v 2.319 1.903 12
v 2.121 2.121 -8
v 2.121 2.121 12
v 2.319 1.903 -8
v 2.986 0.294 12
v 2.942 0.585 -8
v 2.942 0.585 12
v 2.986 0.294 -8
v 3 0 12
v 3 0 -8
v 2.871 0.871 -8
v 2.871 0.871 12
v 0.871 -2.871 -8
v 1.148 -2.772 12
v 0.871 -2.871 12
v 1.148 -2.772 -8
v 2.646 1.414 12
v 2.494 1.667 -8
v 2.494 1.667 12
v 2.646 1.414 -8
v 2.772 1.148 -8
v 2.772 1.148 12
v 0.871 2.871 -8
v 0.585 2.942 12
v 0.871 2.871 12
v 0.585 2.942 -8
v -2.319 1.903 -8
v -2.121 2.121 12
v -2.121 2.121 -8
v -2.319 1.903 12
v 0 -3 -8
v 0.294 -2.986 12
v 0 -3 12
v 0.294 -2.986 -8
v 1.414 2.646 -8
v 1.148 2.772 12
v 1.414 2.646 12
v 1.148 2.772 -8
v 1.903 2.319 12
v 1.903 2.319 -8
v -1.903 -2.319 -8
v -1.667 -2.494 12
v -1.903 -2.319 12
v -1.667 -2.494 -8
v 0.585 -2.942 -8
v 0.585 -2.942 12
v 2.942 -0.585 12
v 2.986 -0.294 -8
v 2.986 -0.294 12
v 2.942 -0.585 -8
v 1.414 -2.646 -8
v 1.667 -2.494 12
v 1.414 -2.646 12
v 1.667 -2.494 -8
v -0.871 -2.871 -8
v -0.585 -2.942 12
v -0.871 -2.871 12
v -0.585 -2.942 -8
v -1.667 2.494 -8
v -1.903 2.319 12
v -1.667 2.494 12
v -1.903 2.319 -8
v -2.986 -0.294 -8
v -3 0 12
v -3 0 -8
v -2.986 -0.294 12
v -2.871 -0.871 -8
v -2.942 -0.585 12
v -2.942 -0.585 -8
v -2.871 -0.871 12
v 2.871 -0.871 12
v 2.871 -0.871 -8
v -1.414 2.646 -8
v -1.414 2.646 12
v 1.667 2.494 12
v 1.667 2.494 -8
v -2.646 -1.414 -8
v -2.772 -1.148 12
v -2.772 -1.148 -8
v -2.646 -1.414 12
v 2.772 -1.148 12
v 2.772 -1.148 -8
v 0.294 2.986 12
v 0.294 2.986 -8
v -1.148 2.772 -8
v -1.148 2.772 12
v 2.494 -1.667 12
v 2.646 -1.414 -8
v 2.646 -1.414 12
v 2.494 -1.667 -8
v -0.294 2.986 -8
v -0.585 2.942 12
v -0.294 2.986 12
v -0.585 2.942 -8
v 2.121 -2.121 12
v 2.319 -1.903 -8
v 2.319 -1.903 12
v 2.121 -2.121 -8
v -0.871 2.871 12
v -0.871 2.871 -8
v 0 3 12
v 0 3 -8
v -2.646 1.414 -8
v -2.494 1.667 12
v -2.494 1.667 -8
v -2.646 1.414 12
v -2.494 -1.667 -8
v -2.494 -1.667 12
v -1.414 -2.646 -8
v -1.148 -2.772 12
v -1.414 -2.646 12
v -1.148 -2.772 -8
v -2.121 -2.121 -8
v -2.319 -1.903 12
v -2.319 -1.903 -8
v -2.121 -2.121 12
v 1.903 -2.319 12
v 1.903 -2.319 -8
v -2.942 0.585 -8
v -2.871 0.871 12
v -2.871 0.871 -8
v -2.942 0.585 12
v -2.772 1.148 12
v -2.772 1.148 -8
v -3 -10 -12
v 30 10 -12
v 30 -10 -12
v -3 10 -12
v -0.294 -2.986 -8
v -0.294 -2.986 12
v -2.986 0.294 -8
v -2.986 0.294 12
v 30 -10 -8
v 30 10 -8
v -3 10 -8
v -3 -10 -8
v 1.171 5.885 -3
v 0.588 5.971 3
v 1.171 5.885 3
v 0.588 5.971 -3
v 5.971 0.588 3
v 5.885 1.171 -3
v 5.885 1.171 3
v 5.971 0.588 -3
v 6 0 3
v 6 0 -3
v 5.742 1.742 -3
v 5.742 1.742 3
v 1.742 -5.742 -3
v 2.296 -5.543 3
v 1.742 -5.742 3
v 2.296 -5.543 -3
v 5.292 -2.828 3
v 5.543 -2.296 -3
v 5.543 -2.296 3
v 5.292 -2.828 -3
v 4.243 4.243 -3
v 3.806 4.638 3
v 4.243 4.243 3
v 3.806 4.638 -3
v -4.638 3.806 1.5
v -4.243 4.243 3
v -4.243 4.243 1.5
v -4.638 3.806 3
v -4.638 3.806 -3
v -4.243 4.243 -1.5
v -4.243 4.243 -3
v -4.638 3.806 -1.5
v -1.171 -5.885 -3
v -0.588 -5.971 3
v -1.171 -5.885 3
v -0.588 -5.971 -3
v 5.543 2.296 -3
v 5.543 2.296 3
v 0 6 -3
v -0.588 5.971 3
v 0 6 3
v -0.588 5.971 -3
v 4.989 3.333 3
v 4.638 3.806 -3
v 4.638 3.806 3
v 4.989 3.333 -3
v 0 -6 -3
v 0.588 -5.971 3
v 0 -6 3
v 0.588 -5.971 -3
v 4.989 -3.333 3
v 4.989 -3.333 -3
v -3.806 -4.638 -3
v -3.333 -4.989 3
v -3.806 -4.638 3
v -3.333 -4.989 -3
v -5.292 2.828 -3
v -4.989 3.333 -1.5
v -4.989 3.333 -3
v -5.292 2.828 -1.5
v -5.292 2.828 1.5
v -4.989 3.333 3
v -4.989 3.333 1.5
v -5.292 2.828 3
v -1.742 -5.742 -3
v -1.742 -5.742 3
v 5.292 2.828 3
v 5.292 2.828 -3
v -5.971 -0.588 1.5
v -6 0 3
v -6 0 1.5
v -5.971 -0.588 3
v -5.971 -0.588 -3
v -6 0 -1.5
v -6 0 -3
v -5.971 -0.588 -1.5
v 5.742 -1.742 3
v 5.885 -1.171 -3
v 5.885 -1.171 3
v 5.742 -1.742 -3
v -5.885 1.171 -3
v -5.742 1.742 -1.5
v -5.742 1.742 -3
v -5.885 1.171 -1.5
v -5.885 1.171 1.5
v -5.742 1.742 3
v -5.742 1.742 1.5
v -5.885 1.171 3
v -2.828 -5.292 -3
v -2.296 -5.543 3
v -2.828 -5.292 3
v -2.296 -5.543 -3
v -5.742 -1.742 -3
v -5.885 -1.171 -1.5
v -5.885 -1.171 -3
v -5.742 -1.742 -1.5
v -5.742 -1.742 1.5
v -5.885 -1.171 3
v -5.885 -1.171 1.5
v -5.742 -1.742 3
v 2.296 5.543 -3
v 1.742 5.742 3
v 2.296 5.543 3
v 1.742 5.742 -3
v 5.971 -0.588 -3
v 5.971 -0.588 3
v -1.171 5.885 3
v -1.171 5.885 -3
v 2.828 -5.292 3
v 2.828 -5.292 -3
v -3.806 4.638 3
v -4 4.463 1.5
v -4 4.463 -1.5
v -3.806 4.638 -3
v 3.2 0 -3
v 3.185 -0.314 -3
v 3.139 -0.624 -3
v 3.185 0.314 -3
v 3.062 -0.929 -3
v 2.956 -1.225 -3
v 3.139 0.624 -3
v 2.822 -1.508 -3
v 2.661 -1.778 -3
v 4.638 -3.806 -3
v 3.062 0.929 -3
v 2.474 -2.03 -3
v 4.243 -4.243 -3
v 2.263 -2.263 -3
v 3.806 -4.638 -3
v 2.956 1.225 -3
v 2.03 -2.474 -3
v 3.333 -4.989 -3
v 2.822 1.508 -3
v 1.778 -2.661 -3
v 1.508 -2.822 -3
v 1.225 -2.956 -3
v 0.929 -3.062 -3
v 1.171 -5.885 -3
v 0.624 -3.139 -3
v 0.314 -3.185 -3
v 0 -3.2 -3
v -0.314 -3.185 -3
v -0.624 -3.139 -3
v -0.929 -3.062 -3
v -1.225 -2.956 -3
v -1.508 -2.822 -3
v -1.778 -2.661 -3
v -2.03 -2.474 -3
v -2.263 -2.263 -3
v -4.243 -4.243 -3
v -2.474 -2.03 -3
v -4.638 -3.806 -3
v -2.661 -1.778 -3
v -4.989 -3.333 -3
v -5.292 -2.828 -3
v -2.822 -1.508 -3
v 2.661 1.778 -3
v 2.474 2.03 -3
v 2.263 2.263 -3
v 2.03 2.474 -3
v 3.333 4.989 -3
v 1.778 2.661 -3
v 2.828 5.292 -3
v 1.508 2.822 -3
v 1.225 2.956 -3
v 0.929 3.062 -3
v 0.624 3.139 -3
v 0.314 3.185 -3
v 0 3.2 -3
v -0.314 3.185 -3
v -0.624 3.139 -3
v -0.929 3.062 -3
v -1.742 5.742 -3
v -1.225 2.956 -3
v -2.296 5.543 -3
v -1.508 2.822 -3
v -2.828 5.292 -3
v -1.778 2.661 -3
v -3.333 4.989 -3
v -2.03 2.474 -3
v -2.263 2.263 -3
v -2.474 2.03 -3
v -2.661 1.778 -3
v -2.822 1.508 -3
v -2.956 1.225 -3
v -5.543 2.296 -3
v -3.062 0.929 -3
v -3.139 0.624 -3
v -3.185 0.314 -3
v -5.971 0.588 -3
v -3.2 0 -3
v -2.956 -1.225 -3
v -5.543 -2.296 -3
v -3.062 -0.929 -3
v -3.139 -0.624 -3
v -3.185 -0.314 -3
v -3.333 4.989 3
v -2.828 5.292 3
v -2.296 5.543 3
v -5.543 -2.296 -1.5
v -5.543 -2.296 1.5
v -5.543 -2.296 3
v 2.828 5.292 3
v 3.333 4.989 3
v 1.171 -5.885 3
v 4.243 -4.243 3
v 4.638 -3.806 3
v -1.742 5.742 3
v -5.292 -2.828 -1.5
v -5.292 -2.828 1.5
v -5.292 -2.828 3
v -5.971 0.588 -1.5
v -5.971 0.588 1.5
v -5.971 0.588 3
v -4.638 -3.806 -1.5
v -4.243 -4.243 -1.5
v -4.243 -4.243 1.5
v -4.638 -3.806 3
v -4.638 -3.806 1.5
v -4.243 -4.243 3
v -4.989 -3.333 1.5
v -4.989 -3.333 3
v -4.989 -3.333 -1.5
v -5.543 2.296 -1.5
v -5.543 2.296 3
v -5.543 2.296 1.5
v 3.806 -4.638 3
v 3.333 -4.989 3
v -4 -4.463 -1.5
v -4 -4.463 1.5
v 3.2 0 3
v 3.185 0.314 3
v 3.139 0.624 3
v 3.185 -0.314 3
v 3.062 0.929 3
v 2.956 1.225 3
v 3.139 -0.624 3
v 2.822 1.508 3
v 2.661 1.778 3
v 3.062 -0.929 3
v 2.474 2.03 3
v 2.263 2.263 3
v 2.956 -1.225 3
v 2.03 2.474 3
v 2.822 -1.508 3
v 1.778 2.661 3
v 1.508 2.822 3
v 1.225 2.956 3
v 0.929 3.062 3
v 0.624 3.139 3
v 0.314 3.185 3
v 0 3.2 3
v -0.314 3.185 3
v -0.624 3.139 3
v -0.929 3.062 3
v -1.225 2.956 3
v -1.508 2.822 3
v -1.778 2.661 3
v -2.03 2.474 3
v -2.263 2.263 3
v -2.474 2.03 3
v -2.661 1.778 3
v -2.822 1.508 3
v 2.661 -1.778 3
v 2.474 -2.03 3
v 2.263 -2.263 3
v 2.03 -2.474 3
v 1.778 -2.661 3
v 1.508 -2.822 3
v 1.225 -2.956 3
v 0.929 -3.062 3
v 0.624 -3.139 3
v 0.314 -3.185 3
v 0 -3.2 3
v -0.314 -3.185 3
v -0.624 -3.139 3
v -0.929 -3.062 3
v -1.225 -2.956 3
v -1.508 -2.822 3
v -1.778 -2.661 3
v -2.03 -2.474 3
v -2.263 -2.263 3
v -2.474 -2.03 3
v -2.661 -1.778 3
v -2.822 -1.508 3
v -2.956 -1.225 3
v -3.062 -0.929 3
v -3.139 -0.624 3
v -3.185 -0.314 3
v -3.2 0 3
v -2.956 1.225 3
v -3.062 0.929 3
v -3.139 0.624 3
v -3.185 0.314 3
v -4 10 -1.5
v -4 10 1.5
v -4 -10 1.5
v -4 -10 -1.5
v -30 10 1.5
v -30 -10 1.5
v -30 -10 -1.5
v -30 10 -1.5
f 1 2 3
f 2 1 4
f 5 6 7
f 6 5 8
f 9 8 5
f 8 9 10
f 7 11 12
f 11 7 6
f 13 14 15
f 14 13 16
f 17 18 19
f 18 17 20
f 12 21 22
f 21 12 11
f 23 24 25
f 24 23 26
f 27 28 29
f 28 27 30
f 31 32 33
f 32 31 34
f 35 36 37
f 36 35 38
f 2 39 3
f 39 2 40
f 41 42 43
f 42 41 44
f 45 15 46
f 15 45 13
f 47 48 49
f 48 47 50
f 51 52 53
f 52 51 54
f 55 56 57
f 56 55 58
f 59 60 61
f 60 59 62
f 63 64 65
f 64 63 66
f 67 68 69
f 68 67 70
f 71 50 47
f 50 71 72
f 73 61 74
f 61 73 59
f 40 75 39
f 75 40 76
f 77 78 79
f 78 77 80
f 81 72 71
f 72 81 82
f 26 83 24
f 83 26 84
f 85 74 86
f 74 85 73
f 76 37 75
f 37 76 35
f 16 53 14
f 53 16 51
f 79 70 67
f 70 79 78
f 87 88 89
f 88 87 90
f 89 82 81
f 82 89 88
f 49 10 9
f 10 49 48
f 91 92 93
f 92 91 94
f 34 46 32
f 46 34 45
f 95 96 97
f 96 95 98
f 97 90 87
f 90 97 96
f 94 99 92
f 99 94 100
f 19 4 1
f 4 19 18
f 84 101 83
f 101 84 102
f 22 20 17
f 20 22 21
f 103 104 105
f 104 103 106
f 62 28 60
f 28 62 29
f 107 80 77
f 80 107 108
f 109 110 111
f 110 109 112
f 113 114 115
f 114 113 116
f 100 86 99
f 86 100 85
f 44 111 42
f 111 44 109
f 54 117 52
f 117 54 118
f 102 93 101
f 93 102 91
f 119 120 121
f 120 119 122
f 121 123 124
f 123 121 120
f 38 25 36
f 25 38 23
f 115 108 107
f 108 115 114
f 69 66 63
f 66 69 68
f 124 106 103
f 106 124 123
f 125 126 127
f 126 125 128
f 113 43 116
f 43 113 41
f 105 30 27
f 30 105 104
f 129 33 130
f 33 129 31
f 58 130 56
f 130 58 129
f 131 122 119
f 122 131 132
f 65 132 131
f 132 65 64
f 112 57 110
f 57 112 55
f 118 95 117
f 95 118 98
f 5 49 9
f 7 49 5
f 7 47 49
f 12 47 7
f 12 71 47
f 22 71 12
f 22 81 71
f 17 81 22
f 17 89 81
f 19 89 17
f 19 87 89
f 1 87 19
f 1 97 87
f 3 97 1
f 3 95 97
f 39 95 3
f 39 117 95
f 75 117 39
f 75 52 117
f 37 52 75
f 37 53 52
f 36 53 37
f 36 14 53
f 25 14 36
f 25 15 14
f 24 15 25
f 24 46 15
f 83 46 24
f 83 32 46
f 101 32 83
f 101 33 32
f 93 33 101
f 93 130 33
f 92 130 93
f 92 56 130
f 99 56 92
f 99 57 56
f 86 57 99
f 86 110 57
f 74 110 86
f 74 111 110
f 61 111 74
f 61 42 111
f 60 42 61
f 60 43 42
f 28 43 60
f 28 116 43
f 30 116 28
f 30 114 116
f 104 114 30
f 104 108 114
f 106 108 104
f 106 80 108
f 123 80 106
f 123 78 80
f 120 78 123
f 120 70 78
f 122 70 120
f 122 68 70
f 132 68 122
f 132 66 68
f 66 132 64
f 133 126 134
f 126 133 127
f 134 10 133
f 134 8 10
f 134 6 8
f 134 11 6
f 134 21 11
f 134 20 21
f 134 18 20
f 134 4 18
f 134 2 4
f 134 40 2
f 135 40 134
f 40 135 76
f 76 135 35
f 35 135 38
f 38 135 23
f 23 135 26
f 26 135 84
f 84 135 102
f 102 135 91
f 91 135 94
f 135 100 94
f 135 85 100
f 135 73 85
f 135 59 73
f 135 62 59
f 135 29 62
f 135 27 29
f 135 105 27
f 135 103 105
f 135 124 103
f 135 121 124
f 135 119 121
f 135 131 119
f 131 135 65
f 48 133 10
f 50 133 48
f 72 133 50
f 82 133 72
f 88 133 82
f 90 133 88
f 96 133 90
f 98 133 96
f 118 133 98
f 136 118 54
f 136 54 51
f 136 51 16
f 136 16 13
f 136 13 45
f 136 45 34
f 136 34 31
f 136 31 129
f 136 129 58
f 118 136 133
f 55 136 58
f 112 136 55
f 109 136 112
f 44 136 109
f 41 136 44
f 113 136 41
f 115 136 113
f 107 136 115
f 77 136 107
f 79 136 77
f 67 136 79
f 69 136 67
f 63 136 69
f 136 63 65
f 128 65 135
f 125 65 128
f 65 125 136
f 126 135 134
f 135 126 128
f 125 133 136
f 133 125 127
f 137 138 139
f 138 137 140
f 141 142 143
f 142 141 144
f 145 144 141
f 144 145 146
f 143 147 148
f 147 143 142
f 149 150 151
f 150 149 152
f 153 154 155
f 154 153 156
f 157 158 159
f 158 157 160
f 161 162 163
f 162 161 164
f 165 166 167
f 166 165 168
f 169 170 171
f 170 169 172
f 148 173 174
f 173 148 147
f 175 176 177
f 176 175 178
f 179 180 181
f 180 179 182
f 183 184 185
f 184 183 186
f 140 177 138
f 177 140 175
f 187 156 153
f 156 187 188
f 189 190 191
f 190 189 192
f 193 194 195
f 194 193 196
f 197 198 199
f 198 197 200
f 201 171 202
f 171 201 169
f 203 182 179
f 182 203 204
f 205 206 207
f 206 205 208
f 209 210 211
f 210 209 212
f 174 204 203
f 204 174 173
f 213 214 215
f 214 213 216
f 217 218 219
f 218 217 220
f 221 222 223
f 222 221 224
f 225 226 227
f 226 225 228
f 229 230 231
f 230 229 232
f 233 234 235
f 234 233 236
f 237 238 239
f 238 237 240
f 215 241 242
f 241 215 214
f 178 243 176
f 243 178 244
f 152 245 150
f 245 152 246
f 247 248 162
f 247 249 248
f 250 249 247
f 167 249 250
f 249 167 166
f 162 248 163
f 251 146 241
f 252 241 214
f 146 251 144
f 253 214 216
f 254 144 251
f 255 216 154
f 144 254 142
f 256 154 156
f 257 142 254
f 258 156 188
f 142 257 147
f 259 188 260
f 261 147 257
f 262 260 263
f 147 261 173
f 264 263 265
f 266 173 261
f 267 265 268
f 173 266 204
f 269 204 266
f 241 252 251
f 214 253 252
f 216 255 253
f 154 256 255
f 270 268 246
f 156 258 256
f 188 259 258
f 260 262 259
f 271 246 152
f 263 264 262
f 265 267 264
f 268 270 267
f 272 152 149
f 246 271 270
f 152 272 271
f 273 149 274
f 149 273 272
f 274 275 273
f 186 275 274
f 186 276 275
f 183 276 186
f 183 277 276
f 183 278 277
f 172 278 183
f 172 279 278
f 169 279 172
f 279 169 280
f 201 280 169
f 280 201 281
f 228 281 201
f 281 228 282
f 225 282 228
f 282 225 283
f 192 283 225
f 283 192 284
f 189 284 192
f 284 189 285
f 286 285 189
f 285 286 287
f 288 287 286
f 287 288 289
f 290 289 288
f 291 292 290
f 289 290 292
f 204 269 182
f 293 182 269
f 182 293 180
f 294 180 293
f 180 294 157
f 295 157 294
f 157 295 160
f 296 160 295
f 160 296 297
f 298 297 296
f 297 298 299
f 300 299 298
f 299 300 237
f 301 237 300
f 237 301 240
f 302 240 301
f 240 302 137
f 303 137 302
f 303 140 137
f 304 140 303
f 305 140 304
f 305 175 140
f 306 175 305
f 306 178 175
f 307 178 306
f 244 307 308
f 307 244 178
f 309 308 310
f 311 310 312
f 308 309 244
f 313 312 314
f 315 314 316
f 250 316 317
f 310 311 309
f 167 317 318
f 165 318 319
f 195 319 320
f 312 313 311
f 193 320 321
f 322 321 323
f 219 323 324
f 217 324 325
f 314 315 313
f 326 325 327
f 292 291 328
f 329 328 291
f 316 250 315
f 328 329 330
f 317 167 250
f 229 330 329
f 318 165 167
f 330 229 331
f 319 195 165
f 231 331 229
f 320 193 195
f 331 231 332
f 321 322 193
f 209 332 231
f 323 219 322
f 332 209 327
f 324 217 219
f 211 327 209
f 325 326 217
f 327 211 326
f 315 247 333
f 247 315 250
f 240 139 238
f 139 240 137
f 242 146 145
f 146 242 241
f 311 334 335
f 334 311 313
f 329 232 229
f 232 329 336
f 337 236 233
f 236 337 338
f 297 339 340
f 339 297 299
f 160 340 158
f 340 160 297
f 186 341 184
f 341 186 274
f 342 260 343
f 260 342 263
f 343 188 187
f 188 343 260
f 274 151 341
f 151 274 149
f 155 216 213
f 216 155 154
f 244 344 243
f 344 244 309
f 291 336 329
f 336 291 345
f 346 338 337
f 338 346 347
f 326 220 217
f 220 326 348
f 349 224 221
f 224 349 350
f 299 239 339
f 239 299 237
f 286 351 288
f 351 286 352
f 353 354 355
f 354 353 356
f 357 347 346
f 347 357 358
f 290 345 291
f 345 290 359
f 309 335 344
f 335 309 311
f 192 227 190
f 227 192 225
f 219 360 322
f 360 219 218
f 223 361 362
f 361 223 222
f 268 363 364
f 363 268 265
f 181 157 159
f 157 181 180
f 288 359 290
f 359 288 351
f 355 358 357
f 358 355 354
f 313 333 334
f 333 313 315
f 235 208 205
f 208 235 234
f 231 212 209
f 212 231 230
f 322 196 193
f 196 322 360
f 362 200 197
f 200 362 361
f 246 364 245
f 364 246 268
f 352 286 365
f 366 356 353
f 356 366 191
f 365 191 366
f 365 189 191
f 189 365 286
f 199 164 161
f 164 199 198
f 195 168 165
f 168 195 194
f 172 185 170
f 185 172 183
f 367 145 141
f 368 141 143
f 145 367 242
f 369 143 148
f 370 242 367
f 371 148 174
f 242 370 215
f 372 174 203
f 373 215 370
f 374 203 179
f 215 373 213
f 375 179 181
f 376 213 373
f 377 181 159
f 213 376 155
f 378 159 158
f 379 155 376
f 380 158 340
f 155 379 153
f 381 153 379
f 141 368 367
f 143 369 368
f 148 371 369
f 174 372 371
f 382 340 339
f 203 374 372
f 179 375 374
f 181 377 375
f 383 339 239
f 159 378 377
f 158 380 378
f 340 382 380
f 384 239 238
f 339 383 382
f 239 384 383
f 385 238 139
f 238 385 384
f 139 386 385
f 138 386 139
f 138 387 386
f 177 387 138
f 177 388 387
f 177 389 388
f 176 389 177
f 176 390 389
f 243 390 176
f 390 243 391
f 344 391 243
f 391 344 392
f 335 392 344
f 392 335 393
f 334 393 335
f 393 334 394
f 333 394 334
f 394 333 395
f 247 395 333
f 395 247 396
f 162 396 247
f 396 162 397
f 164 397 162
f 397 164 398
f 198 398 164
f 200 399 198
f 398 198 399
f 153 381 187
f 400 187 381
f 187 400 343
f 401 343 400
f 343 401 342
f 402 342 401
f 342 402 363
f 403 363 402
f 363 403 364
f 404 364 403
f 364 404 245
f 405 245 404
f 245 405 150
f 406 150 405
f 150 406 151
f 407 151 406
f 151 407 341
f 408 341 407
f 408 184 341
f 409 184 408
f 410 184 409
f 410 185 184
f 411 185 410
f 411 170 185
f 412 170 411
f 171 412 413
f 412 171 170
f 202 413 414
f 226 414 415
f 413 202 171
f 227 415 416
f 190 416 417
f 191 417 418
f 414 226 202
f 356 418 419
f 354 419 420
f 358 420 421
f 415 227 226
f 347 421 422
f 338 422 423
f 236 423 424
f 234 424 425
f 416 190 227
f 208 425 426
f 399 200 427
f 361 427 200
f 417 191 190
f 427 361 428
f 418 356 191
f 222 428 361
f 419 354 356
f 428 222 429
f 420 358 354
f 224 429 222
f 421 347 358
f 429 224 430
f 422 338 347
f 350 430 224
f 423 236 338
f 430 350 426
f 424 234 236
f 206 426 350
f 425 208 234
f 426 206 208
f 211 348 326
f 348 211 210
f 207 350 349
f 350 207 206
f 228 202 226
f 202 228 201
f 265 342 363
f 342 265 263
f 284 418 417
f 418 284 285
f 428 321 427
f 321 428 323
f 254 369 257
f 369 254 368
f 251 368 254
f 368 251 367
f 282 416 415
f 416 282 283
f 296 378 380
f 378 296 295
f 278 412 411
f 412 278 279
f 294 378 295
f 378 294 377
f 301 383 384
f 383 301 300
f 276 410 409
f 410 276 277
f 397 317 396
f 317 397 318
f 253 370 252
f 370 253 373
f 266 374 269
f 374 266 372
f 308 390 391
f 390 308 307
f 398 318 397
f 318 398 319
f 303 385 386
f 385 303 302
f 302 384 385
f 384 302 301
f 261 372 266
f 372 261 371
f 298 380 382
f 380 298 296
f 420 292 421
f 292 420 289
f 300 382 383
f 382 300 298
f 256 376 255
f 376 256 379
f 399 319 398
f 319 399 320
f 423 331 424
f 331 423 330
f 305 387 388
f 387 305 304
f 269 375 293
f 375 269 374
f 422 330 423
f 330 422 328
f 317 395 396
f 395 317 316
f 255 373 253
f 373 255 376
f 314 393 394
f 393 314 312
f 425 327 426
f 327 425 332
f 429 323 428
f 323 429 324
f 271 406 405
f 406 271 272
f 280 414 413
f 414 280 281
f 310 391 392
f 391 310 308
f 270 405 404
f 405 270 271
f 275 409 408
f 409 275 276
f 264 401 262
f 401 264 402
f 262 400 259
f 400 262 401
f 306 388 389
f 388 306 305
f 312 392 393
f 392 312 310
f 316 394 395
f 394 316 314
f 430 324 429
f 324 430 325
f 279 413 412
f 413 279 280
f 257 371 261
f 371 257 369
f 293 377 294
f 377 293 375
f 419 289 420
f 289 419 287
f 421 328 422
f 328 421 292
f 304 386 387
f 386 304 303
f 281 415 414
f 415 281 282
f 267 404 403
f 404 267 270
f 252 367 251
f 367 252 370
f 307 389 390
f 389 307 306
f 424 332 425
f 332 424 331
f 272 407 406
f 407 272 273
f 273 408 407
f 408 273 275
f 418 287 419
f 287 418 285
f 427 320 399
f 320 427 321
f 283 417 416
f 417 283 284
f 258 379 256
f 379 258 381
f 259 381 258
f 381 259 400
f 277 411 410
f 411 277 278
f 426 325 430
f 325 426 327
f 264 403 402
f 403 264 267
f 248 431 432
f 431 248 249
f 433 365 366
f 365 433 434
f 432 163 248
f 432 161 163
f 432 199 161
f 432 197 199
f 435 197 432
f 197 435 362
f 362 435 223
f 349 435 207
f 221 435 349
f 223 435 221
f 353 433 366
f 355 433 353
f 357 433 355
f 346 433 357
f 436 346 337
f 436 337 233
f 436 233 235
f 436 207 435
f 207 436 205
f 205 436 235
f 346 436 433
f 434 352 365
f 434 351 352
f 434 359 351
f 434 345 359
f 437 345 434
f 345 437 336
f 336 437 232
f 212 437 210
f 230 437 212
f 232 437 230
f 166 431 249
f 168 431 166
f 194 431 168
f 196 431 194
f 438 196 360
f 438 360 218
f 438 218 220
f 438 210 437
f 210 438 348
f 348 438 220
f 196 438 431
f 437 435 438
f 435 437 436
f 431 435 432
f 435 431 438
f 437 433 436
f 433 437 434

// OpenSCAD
$fn = 64;

agentscad_part = "all";
hinge_angle = 0;

pin_d = 6;
pin_r = pin_d / 2;
clearance = 0.4;
hole_r = (pin_d + clearance) / 2;
pin_h = 24;
pin_z0 = -12;
bushing_outer_r = 6;
bushing_h = 6;
bushing_z0 = -3;
moving_leaf_thickness = 3;
moving_leaf_z0 = -1.5;
fixed_leaf_thickness = 4;
fixed_leaf_z0 = -12;

module fixed_part() {
    union() {
        translate([0, 0, pin_z0])
            cylinder(h = pin_h, r = pin_r, center = false);
        translate([-3, -10, fixed_leaf_z0])
            cube([33, 20, fixed_leaf_thickness]);
    }
}

module moving_part() {
    rotate([0, 0, hinge_angle])
    union() {
        translate([0, 0, bushing_z0])
            difference() {
                cylinder(h = bushing_h, r = bushing_outer_r, center = false);
                translate([0, 0, -0.01])
                    cylinder(h = bushing_h + 0.02, r = hole_r, center = false);
            }
        translate([-30, -10, moving_leaf_z0])
            cube([26, 20, moving_leaf_thickness]);
    }
}

if (agentscad_part == "all" || agentscad_part == "fixed") fixed_part();
if (agentscad_part == "all" || agentscad_part == "moving") moving_part();
